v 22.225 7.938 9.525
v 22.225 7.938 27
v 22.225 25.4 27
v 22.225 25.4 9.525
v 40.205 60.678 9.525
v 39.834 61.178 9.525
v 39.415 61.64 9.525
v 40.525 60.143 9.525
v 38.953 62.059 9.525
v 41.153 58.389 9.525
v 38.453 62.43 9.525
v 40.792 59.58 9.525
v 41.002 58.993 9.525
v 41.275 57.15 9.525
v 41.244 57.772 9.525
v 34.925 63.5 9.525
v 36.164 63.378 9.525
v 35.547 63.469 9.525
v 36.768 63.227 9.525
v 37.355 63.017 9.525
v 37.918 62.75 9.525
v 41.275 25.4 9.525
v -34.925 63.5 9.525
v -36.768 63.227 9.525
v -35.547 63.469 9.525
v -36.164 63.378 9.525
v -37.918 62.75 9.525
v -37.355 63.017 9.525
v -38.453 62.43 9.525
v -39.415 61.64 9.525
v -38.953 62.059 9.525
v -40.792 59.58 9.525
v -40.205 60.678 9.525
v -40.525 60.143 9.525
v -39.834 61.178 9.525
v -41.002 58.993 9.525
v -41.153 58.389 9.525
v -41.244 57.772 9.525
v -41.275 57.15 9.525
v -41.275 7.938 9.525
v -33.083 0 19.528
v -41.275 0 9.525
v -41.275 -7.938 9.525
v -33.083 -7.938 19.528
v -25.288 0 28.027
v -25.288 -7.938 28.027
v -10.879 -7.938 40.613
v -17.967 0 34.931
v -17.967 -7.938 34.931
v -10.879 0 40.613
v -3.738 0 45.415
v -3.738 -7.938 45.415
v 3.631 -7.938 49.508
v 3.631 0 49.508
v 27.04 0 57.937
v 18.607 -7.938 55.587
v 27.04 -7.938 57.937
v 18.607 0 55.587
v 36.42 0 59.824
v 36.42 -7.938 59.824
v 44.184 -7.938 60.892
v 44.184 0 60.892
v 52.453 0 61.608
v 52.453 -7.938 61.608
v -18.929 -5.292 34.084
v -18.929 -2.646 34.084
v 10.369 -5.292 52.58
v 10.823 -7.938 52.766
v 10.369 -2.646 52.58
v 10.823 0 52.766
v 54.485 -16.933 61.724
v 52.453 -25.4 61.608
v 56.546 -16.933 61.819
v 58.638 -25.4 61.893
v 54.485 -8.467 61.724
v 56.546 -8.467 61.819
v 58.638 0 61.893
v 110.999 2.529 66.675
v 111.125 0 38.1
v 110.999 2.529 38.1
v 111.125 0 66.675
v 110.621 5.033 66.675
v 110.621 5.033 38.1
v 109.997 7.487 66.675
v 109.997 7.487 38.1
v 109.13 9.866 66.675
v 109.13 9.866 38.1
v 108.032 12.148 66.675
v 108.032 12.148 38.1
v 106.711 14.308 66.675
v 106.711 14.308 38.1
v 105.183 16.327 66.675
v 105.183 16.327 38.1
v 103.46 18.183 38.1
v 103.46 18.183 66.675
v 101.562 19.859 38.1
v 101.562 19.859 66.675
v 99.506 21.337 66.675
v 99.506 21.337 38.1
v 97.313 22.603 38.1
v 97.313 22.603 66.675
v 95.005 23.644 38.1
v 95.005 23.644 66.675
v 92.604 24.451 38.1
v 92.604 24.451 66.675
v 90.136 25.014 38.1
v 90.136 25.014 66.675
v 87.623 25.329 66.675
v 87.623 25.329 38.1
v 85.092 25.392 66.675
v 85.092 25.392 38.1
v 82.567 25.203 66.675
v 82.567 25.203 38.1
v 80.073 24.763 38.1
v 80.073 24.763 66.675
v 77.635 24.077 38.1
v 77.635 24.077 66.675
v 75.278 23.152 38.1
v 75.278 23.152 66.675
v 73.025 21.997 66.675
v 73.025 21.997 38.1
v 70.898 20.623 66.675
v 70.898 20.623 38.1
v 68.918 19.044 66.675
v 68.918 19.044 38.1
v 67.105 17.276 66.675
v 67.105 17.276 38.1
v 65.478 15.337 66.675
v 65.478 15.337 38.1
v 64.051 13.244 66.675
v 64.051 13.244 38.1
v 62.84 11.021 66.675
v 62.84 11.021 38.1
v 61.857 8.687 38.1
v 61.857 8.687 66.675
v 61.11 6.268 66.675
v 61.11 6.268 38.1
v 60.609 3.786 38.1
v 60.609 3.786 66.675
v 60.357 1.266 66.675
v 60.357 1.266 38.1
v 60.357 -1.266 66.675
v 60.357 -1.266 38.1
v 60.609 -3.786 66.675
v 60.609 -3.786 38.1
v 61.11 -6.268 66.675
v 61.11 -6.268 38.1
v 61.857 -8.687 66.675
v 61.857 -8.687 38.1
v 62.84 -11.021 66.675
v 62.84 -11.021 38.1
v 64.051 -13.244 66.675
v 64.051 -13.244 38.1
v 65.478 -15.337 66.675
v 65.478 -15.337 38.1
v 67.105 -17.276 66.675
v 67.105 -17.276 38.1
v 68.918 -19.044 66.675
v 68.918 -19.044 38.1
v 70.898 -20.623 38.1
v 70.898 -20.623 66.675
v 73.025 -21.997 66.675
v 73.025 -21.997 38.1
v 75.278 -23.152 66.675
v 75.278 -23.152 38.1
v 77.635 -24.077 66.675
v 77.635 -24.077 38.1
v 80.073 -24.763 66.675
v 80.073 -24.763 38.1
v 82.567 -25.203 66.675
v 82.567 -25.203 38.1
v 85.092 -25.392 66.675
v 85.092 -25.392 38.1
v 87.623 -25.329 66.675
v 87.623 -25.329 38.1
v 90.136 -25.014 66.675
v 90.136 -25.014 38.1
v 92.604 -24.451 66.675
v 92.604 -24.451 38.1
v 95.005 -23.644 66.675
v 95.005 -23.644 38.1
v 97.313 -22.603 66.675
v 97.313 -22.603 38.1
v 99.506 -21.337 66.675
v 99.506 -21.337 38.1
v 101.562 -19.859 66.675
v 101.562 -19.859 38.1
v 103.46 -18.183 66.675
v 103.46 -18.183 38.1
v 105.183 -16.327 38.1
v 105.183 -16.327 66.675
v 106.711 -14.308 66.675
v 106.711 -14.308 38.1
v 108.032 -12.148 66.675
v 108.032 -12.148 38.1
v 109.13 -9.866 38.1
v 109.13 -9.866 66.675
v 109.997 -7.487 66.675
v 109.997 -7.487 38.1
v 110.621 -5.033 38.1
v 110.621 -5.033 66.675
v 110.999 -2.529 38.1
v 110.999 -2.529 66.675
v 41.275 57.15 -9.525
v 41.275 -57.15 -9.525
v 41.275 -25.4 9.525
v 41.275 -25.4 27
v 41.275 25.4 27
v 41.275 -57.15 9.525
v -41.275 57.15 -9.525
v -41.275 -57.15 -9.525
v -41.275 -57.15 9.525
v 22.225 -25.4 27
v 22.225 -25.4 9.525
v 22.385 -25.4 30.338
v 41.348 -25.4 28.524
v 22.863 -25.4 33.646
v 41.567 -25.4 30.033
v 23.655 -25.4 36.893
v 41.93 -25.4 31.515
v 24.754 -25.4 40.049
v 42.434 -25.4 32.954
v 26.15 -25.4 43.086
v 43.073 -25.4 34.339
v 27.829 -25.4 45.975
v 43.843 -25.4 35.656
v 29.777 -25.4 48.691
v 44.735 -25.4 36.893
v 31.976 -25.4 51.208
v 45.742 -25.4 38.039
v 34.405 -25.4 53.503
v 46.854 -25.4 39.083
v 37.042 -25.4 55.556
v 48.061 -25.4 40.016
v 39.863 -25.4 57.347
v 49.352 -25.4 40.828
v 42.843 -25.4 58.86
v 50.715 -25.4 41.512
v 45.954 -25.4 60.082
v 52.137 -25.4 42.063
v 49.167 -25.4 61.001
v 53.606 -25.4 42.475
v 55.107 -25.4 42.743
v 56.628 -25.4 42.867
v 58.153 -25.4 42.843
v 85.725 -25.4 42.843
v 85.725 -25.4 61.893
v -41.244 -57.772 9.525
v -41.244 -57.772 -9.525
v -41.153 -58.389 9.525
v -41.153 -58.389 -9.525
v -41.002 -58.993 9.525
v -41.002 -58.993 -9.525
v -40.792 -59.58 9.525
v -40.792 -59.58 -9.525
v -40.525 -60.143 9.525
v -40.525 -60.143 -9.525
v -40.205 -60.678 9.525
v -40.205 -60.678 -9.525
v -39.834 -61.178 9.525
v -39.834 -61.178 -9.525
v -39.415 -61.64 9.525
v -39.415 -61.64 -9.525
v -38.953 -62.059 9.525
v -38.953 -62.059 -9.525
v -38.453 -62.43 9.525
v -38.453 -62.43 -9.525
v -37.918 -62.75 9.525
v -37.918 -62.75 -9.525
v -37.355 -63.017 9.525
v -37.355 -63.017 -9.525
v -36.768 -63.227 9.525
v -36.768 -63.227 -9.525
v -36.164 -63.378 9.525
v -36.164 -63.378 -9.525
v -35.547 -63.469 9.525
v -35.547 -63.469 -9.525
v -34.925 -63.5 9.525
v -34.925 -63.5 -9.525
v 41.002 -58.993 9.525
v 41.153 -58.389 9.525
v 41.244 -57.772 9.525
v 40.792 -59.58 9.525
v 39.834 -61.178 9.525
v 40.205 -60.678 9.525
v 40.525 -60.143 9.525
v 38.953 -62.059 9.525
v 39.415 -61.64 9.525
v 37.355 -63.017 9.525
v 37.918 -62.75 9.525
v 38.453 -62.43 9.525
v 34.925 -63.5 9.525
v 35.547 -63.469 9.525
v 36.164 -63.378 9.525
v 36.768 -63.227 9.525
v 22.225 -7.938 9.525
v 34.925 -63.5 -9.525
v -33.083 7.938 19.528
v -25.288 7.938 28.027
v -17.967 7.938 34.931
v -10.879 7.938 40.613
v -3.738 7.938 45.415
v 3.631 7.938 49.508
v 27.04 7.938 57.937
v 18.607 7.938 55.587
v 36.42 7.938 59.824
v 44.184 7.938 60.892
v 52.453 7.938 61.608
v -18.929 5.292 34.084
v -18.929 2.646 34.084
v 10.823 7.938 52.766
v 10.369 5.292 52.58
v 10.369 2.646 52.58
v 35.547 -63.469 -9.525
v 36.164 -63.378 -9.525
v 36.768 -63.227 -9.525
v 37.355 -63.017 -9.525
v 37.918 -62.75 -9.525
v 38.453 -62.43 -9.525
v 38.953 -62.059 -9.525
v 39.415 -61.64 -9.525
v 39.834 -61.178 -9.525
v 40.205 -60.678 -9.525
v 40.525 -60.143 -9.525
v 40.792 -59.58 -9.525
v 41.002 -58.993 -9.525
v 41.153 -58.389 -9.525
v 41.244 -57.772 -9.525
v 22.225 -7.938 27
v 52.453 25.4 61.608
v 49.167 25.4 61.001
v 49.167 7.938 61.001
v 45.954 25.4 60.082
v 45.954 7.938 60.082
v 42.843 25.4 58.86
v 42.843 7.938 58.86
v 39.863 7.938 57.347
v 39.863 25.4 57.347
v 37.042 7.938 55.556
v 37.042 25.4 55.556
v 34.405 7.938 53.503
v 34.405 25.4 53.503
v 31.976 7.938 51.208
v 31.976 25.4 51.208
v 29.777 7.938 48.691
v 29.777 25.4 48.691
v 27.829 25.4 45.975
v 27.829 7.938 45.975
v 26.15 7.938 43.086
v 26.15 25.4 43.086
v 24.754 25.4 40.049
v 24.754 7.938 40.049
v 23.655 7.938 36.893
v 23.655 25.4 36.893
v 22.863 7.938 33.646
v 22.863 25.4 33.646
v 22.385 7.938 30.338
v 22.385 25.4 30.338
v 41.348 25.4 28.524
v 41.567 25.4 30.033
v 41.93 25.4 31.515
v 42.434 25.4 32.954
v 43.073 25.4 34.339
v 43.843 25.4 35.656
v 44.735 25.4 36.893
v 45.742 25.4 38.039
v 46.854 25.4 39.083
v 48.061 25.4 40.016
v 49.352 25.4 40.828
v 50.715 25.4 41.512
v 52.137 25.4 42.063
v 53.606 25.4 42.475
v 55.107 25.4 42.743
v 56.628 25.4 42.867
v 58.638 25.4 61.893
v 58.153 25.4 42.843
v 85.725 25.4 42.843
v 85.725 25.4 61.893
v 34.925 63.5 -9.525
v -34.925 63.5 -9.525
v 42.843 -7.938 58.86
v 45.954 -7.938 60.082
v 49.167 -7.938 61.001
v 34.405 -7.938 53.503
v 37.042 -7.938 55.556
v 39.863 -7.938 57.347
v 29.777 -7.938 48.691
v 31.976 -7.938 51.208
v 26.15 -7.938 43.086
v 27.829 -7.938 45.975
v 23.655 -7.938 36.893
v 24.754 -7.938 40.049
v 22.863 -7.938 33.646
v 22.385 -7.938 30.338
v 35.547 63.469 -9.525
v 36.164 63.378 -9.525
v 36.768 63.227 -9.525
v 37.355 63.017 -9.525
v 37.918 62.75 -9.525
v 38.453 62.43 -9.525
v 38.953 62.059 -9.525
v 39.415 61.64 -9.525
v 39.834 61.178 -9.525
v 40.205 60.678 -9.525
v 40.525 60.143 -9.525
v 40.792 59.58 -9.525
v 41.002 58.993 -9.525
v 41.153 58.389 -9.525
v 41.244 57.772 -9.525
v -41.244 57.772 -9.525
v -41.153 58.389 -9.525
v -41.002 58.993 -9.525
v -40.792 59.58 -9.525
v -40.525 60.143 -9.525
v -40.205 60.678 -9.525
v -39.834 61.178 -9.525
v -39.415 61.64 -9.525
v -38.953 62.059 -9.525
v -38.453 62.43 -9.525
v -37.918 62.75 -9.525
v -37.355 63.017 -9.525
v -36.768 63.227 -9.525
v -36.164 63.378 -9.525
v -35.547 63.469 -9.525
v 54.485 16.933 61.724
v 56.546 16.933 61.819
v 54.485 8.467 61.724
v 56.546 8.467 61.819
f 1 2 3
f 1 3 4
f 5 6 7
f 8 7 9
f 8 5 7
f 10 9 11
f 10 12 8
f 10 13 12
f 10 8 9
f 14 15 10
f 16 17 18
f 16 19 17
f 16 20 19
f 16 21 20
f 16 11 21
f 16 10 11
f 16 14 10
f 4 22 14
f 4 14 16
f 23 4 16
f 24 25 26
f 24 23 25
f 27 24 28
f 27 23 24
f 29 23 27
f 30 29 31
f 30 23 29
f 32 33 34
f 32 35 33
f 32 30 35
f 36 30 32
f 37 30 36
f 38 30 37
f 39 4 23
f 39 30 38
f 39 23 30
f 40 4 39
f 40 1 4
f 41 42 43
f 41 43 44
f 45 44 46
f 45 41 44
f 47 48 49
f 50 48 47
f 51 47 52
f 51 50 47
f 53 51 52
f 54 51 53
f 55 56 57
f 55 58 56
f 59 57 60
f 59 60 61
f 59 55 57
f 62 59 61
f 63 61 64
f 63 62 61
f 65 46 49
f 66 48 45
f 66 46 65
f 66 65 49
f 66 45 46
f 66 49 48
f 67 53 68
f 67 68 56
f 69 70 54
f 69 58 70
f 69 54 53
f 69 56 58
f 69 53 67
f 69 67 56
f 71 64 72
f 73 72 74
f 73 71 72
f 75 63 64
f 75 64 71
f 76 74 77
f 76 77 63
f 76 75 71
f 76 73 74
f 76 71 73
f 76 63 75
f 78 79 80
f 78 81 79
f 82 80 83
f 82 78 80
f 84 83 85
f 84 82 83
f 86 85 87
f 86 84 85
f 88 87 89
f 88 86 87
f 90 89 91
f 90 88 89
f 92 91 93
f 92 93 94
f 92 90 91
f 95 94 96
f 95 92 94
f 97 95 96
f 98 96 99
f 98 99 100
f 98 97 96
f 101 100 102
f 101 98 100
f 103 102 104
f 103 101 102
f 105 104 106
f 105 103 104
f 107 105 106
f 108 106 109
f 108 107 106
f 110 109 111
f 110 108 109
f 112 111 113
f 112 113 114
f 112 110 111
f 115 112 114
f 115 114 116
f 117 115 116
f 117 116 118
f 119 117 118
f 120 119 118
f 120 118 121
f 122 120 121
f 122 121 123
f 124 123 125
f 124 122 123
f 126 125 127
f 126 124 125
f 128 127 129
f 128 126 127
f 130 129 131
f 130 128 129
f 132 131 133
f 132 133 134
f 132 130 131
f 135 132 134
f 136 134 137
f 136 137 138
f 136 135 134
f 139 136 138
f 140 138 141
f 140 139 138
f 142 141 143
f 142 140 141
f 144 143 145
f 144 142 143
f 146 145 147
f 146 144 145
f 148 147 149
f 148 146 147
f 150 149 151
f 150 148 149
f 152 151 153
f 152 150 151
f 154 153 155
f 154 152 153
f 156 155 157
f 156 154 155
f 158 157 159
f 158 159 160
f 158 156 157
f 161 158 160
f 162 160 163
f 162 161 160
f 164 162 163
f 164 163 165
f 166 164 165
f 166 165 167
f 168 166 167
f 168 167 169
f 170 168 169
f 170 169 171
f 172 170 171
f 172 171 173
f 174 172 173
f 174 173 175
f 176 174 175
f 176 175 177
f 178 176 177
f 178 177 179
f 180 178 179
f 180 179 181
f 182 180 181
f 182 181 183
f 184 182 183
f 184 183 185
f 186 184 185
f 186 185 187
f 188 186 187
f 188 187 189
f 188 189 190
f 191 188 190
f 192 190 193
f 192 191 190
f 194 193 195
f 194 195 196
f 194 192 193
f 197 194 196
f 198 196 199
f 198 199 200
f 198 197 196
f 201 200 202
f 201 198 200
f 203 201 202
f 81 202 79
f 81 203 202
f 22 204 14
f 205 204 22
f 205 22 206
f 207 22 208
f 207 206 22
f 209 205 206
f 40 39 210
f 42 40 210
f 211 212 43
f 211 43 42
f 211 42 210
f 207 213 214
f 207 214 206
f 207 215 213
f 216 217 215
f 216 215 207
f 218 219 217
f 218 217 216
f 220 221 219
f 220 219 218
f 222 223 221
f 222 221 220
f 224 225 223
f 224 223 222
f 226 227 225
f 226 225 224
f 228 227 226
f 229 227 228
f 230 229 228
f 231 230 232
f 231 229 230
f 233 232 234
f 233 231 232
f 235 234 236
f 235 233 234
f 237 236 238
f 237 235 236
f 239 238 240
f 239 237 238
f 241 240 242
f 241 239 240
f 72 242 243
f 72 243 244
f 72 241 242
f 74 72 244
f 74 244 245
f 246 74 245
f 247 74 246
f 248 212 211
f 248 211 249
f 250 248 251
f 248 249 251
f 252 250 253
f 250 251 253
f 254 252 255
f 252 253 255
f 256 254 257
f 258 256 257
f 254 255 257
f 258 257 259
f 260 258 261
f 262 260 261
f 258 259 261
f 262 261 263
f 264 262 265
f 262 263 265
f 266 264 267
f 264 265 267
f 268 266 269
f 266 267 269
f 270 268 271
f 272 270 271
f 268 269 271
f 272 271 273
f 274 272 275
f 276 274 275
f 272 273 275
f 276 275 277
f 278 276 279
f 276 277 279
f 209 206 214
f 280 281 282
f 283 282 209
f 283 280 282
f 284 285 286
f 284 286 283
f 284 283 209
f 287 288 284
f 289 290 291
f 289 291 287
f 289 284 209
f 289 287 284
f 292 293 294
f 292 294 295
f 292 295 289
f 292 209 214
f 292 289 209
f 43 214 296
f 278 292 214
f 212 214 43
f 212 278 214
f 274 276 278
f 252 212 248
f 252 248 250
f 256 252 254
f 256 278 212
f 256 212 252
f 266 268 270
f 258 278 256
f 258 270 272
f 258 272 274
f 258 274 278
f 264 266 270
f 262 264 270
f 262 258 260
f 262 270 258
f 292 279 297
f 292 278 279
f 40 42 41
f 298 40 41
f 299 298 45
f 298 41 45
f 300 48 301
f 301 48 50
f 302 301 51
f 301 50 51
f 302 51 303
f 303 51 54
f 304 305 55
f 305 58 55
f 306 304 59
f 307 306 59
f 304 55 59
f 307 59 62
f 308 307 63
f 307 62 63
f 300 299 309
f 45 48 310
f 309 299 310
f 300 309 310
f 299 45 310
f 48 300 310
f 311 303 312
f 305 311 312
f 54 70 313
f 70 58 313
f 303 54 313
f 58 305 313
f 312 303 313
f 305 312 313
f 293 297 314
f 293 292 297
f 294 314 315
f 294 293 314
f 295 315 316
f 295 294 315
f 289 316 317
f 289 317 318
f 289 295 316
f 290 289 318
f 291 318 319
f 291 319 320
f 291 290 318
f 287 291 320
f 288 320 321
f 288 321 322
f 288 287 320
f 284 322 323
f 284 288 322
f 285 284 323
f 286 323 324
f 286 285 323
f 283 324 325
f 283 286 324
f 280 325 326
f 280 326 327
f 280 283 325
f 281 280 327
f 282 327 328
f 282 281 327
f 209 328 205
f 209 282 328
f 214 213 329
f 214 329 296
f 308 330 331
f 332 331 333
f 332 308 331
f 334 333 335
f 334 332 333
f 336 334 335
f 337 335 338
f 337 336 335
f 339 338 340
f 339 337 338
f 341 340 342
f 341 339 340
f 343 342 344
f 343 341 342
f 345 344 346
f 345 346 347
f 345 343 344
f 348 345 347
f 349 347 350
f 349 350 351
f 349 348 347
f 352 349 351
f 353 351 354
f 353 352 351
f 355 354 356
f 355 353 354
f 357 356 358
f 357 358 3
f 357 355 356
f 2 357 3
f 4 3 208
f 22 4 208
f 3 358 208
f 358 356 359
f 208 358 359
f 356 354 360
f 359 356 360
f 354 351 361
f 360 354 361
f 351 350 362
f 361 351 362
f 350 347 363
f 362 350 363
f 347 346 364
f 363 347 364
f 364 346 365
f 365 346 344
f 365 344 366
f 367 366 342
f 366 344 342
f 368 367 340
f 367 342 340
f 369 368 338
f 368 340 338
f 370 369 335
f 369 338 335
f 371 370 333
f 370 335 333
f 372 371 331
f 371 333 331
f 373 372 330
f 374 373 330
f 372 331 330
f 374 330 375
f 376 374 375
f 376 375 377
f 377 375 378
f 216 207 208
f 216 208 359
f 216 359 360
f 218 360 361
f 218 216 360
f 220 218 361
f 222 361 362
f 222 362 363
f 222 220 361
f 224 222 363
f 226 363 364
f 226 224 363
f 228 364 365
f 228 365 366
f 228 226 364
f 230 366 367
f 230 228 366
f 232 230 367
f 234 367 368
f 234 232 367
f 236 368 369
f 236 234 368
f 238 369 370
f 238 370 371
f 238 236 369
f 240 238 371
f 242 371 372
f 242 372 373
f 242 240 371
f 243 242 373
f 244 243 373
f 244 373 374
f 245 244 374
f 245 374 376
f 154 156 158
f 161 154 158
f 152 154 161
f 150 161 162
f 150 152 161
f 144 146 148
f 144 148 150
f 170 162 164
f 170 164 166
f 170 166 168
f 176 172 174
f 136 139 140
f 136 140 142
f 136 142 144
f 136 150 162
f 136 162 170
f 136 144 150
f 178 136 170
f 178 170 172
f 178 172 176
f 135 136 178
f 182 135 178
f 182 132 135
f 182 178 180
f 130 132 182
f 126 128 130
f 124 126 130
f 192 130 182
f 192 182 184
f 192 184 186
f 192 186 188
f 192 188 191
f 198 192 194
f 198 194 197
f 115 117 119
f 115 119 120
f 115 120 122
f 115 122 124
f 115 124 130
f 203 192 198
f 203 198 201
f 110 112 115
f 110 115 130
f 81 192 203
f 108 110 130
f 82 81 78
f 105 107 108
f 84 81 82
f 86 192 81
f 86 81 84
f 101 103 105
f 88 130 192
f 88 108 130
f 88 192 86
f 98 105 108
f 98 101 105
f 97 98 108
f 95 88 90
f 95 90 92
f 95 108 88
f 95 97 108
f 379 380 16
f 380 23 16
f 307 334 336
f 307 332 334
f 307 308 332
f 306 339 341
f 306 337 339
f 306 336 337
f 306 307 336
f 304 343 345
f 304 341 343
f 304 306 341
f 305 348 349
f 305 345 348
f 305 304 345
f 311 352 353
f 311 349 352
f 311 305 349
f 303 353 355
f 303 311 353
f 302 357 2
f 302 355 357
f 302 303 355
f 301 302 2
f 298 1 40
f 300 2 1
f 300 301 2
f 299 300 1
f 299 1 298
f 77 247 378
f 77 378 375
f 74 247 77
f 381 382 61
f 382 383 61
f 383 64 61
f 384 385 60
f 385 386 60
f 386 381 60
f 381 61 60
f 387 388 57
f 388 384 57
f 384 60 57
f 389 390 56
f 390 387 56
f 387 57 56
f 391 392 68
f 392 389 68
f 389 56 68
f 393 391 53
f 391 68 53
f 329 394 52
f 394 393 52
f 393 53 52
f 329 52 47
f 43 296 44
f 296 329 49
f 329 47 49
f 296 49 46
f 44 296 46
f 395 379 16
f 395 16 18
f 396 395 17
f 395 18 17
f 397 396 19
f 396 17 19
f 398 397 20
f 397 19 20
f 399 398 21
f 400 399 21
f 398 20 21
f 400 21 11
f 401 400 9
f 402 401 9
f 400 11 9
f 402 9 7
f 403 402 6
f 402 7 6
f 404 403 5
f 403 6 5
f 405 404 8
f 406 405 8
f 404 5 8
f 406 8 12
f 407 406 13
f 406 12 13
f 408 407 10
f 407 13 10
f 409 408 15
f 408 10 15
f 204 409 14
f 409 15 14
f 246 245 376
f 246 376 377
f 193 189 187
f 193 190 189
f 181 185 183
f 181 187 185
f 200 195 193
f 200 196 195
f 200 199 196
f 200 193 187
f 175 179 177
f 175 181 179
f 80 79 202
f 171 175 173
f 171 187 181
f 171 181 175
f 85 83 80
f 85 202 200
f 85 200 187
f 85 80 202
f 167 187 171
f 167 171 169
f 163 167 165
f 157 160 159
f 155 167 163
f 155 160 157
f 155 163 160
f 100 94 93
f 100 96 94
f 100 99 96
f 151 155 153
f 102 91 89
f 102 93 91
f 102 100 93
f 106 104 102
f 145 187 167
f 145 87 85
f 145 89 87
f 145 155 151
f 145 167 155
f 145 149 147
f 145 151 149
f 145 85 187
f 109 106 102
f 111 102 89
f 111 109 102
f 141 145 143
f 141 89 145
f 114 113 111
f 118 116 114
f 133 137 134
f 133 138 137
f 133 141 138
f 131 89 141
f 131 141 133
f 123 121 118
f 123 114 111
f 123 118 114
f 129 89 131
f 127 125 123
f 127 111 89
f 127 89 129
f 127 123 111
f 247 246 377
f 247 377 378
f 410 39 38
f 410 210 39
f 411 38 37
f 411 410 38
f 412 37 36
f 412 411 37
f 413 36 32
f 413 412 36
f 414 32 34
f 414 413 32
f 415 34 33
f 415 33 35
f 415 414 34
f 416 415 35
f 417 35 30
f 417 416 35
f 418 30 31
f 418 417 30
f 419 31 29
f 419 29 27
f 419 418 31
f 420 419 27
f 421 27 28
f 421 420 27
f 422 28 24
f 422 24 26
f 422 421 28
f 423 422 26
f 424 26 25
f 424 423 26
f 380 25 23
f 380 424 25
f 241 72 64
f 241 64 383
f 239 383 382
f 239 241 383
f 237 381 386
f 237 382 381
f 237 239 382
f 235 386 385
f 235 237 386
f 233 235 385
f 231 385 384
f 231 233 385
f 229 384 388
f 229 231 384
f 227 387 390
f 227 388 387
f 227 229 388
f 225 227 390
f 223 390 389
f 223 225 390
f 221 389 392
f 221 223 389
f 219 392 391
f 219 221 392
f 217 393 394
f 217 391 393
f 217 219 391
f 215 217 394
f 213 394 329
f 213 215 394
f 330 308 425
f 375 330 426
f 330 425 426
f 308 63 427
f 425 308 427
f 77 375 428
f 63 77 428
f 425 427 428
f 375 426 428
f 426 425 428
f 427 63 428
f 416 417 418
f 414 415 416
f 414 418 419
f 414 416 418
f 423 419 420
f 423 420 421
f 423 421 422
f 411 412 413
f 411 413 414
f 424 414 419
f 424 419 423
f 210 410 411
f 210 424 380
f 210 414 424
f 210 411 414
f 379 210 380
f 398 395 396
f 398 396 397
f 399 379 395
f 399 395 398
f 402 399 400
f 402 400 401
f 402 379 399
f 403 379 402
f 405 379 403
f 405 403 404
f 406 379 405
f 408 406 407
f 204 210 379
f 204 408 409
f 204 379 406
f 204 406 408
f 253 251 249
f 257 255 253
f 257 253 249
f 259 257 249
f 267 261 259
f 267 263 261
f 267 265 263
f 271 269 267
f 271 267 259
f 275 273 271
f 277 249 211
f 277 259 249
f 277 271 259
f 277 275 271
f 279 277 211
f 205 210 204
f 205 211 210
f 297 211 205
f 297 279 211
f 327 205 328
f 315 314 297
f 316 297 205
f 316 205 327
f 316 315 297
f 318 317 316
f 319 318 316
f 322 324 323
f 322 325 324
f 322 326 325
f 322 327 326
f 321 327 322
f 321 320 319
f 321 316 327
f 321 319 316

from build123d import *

# Parameters (mm, degrees)
F1_DEPTH = 63.5
F0_W     = 25.4
F0_H     = 19.05
F2_DEPTH = 25.4
F3_DEPTH = 7.9375
F5_R     = 6.35


with BuildPart() as f1:
    # F0 (on Front) → F1 (new body, symmetric)
    with BuildSketch(Plane.XZ):
        Polygon((-41.275, -9.525), (41.275, -9.525), (41.275, 9.525), (22.225, 9.525), (-41.275, 9.525), align=None)
    extrude(amount=F1_DEPTH, both=True)

    # F0 (on Front) → F2 (join, symmetric)
    with BuildSketch(Plane.XZ):
        with BuildLine():
            Line((22.225, 9.525), (41.275, 9.525))
            Line((41.275, 9.525), (41.275, 27.0002))
            ThreePointArc((41.275, 27.0002), (46.2850237242, 38.5746509817), (58.1528476254, 42.8434926388))
            Line((58.1528476254, 42.8434926388), (60.325, 42.8434926388))
            Line((60.325, 42.8434926388), (60.325, 61.8934926388))
            Line((60.325, 61.8934926388), (58.6378688852, 61.8934926388))
            add(Edge.make_bspline(
                [(52.4534551794, 61.6079750187), (54.4697086155, 61.7343456613), (56.5306203793, 61.8298446607), (58.6378688852, 61.8934926388)],
                knots=[108.4678965171, 108.4678965171, 108.4678965171, 108.4678965171, 112.8053207528, 112.8053207528, 112.8053207528, 112.8053207528], degree=3))
            ThreePointArc((52.4534551794, 61.6079750187), (30.8461746807, 49.9754997493), (22.225, 27.0002))
            Line((22.225, 27.0002), (22.225, 9.525))
        make_face()
        with Locations((73.025, 52.3684926388)):
            Rectangle(F0_W, F0_H)
    extrude(amount=F2_DEPTH, both=True)

    # F0 (on Front) → F3 (join, symmetric)
    with BuildSketch(Plane.XZ):
        with BuildLine():
            add(Edge.make_bspline(
                [(-41.275, 9.525), (-20.4611566288, 35.9812911756), (2.0321089665, 58.447768169), (52.4534551794, 61.6079750187)],
                knots=[0, 0, 0, 0, 108.4678965171, 108.4678965171, 108.4678965171, 108.4678965171], degree=3))
            Line((-41.275, 9.525), (22.225, 9.525))
            Line((22.225, 9.525), (22.225, 27.0002))
            ThreePointArc((22.225, 27.0002), (30.8461746807, 49.9754997493), (52.4534551794, 61.6079750187))
        make_face()
    extrude(amount=F3_DEPTH, both=True)

    # F5
    f5_edges = [f1.edges().sort_by_distance(p)[0] for p in [
        (41.275, 63.5, 0),
        (41.275, -63.5, 0),
        (-41.275, -63.5, 0),
        (-41.275, 63.5, 0),
    ]]
    fillet(f5_edges, radius=F5_R)


with BuildPart() as f4:
    # F0 (on Front) → F4 (revolve)
    with BuildSketch(Plane.XZ):
        Polygon((85.725, 61.8934926388), (85.725, 42.8434926388), (85.725, 38.1), (111.125, 38.1), (111.125, 66.675), (85.725, 66.675), align=None)
    revolve(axis=Axis((85.725, 0, 52.3684926388), (0, 0, 1)))


solid = Compound([f1.part, f4.part])
